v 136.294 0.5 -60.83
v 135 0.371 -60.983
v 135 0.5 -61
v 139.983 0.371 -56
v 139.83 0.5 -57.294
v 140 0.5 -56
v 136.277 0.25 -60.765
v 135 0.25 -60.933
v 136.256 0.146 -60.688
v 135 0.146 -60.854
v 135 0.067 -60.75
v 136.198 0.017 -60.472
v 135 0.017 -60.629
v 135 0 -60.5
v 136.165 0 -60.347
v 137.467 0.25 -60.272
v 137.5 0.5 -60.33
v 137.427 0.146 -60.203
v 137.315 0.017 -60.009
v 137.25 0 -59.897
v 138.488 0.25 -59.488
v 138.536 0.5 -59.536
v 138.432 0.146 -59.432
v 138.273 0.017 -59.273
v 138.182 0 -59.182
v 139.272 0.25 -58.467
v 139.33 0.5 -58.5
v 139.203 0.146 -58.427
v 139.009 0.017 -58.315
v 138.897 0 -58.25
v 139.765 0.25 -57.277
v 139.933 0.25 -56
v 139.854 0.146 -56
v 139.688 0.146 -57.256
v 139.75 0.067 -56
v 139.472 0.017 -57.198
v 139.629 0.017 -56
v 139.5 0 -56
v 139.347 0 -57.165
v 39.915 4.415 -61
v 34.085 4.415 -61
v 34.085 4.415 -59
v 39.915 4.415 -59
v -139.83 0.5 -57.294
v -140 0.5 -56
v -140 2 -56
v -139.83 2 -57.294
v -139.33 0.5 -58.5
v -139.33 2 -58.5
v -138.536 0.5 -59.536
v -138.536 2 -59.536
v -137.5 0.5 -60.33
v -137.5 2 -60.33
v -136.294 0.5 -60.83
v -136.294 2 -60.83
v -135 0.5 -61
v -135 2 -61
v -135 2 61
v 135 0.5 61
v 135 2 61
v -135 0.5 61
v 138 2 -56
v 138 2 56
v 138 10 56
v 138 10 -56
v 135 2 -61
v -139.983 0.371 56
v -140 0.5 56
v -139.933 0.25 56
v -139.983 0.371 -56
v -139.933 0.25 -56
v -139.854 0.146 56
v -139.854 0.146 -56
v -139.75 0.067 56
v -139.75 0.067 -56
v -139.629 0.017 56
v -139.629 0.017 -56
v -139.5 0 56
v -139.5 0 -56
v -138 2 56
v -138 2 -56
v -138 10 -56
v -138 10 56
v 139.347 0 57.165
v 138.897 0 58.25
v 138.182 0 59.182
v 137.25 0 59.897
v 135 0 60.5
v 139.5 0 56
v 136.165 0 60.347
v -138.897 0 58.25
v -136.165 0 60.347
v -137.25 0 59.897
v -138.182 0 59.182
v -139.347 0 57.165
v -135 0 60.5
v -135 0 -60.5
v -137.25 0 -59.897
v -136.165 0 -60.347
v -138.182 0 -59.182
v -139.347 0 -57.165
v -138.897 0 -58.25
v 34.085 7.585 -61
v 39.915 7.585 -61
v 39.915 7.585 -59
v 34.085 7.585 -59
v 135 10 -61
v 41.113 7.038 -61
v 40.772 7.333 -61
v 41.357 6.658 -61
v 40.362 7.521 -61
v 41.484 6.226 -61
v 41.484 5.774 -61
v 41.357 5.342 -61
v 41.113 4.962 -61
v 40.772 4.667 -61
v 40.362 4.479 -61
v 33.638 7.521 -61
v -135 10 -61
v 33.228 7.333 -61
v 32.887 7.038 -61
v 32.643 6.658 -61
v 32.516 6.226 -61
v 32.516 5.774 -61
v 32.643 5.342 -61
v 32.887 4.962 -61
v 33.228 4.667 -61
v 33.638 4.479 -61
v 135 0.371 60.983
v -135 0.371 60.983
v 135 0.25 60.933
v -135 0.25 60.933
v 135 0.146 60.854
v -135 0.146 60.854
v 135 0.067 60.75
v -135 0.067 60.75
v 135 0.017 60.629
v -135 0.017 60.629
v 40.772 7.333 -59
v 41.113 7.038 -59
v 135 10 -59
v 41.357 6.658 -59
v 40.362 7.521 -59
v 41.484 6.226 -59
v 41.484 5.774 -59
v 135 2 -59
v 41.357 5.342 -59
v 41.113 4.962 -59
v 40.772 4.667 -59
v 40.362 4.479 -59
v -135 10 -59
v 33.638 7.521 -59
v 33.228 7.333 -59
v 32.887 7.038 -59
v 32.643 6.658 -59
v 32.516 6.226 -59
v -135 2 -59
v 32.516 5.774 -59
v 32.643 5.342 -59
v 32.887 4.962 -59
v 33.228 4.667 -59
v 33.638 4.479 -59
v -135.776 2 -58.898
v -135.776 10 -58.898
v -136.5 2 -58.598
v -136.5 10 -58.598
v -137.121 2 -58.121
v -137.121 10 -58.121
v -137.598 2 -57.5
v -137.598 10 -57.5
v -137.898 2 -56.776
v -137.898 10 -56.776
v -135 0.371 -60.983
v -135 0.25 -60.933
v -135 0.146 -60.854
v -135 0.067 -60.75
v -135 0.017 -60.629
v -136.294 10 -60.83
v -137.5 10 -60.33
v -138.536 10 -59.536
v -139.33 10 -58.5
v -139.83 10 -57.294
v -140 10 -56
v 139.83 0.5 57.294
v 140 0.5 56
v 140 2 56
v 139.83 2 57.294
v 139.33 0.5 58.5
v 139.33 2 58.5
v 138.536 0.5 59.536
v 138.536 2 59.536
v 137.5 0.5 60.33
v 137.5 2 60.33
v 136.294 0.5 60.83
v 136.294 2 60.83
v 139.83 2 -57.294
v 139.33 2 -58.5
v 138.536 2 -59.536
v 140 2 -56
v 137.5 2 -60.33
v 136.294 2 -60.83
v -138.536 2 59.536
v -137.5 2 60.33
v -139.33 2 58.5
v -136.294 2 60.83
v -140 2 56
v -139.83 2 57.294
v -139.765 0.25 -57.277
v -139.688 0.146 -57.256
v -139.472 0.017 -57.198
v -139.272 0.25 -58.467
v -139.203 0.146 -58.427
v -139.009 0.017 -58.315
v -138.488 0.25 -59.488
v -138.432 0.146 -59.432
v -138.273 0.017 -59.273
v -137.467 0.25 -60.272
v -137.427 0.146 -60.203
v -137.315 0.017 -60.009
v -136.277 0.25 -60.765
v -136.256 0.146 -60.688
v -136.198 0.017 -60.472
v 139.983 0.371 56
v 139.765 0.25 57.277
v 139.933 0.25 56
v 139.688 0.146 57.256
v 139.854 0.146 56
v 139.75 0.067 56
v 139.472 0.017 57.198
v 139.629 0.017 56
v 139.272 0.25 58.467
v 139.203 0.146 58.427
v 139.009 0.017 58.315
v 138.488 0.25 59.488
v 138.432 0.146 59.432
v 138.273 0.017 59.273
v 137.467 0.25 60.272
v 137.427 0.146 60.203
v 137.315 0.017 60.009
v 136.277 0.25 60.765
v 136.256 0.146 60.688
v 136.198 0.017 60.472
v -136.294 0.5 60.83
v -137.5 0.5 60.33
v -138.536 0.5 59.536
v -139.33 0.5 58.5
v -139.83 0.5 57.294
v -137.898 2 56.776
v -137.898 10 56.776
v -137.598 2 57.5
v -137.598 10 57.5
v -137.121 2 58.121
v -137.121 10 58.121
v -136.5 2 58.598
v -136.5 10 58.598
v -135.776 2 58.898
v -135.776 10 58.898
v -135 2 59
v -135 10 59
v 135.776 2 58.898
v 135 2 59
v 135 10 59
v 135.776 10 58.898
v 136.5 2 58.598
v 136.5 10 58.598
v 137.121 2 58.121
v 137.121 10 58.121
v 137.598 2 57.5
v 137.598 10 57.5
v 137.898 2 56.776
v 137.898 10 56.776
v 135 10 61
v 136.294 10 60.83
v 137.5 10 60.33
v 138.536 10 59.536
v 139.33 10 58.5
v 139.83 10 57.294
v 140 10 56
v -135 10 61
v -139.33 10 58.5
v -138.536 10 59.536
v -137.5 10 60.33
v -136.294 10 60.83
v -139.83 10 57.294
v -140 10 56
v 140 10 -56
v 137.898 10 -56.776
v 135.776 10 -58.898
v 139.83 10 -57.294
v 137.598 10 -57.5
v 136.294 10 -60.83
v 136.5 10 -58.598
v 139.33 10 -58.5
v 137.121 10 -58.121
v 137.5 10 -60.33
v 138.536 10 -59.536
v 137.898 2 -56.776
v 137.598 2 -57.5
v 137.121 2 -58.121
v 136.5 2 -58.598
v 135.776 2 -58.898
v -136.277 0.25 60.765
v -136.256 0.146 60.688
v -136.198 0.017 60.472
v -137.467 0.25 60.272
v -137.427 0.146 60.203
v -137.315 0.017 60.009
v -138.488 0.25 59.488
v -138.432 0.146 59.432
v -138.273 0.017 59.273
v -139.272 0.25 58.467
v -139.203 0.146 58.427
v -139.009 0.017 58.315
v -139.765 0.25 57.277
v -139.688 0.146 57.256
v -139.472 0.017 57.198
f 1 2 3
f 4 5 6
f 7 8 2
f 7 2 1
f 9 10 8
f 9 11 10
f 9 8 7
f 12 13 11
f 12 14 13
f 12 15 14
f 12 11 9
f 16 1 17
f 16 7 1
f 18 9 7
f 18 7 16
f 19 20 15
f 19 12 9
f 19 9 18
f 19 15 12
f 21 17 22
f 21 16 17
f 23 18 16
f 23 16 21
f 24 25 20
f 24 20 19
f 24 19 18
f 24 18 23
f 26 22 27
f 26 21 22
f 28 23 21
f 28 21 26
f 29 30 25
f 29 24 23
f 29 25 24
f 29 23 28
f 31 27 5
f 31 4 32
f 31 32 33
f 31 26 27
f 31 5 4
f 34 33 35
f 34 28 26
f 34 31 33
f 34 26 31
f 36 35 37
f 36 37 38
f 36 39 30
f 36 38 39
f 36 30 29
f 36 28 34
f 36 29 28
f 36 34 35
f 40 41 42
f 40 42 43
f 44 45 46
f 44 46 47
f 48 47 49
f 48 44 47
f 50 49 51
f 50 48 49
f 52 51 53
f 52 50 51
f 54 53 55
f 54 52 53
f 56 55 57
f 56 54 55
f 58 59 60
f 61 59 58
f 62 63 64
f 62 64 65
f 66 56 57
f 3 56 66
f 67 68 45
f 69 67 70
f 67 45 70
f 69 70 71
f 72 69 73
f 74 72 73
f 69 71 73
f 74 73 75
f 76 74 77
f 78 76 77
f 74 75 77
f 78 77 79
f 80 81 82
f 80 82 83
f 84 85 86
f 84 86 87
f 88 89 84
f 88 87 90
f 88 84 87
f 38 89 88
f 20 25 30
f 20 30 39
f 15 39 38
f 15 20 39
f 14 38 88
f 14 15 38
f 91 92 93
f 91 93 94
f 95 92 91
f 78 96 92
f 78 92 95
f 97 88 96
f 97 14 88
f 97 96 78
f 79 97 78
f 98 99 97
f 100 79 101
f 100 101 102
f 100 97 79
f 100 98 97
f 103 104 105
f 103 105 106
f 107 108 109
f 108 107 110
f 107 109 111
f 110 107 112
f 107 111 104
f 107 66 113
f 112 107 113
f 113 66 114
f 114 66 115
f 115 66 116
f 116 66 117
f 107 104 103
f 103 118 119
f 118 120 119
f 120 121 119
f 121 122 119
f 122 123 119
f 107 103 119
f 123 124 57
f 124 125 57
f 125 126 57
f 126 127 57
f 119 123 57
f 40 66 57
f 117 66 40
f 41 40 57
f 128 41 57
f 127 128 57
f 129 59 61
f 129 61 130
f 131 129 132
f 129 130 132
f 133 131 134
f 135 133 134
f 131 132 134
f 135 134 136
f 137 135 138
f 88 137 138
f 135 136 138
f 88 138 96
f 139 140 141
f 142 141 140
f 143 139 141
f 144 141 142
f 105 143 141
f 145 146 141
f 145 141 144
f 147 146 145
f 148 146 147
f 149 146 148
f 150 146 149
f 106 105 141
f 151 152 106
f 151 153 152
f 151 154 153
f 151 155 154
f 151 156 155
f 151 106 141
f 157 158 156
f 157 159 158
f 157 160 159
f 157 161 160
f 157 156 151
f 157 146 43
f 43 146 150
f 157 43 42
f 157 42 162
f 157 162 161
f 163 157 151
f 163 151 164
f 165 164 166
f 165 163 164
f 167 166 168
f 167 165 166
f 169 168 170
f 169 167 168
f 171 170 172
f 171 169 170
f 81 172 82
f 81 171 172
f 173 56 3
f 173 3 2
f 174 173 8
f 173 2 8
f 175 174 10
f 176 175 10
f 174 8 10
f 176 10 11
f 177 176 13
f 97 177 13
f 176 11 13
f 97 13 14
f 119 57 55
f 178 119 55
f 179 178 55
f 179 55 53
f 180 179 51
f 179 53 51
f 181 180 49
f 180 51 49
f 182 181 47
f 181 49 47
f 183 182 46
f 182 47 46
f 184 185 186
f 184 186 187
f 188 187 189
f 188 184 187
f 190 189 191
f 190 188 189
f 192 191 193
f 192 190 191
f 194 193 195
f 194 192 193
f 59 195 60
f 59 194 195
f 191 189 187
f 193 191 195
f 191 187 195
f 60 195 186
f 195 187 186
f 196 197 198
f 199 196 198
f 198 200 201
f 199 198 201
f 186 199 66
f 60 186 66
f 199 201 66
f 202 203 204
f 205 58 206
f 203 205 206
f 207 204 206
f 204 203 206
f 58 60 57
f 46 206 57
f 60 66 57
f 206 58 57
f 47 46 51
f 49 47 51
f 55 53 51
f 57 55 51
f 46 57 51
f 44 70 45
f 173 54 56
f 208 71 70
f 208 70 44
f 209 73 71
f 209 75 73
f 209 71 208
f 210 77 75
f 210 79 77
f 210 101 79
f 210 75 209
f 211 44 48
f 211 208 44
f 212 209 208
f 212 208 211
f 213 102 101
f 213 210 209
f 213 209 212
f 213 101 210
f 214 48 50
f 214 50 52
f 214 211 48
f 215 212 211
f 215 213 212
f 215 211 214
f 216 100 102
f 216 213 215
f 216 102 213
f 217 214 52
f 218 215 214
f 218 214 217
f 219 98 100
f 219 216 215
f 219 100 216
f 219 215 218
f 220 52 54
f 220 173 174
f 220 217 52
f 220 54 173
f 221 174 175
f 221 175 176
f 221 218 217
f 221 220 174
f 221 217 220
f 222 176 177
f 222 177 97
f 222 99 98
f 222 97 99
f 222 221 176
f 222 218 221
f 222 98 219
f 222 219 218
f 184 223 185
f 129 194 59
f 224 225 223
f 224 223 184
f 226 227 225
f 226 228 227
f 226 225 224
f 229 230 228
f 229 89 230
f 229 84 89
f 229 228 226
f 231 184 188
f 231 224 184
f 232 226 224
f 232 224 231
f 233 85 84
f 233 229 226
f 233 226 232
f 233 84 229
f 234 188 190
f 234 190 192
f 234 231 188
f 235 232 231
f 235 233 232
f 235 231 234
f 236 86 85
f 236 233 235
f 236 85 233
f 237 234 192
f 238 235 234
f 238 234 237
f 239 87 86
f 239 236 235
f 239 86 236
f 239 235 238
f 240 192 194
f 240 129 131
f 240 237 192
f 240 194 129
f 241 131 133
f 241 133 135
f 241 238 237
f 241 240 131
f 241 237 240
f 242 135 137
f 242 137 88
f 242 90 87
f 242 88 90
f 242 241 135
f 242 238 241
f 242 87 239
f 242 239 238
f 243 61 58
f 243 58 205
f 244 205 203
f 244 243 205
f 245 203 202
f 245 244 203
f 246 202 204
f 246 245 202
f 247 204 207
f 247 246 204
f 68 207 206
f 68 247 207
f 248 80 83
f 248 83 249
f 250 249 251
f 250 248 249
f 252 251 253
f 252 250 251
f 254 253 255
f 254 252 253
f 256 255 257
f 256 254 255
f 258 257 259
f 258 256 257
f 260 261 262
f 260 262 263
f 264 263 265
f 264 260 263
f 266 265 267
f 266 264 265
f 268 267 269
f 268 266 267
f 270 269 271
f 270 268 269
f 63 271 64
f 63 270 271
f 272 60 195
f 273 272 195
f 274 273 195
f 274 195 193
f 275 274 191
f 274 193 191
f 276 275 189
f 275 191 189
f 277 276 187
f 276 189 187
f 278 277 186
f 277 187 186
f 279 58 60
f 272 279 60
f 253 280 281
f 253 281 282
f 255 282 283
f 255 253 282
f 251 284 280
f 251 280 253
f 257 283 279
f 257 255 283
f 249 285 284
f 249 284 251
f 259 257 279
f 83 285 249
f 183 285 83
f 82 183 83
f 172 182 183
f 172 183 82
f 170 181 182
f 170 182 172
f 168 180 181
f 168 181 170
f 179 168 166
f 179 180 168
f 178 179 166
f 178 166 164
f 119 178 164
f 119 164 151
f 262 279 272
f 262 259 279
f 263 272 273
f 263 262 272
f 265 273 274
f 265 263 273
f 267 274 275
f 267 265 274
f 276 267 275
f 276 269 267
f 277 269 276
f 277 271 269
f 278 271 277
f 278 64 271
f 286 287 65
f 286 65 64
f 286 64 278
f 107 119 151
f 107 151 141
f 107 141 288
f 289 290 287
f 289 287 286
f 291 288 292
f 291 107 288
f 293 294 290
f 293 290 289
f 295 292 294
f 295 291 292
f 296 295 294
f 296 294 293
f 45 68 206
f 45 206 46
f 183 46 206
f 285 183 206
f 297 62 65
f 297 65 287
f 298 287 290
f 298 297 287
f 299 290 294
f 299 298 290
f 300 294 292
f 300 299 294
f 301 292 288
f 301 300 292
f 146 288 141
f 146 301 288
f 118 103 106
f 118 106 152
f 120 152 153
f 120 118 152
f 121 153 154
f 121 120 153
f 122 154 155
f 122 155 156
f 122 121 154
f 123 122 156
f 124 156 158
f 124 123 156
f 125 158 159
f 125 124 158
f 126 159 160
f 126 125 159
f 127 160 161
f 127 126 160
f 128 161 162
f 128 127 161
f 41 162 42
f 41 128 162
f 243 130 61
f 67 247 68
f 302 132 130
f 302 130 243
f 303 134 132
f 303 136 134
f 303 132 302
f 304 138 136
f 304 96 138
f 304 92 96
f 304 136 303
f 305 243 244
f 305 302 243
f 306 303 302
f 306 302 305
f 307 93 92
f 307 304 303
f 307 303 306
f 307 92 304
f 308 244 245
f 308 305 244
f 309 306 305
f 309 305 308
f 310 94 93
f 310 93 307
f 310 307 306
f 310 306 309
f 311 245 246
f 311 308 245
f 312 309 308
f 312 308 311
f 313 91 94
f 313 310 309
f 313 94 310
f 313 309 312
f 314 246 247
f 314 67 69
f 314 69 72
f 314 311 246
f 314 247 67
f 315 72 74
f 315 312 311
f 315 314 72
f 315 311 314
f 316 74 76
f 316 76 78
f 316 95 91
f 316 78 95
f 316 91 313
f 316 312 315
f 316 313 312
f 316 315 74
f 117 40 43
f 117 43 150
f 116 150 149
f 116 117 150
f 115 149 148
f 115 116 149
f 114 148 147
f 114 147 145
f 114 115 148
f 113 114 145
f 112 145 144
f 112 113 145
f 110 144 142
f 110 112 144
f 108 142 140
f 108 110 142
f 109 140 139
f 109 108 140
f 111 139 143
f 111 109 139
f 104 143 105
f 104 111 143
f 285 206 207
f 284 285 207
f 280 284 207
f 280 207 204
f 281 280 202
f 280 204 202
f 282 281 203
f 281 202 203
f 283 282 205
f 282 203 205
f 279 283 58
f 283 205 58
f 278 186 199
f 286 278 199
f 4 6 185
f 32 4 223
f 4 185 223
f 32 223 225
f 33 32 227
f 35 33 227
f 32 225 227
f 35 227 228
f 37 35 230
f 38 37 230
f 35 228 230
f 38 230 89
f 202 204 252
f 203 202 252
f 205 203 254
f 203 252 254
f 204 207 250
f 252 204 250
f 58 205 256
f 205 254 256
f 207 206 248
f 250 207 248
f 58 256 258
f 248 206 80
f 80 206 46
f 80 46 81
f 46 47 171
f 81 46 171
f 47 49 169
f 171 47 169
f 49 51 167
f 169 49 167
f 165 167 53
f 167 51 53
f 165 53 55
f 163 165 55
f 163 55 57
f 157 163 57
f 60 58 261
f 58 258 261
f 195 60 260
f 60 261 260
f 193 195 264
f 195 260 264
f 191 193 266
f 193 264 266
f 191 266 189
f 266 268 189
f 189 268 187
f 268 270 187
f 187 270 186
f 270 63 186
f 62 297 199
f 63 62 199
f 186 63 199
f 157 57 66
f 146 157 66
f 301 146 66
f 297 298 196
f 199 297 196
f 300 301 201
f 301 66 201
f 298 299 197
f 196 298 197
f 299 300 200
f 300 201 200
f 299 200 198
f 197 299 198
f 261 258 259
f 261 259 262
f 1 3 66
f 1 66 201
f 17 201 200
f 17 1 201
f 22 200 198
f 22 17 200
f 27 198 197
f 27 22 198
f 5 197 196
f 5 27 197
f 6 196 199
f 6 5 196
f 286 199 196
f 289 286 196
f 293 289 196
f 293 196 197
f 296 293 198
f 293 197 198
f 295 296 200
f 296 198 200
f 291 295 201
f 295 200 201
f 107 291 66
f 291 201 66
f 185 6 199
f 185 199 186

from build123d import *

# Parameters (mm, degrees)
EXTRUDE_1_DEPTH     = 2
EXTRUDE_2_DEPTH     = 8
CUT_EXTRUDE_7_DEPTH = 2
FILLET_1_R          = 0.5


with BuildPart() as part:
    # 草图1 → 凸台-拉伸1 (new body)
    with BuildSketch(Plane(origin=(0, 0, 0), x_dir=(1, 0, 0), z_dir=(0, 1, 0))):
        with BuildLine():
            Line((-135, 61), (135, 61))
            ThreePointArc((135, 61), (138.535533906, 59.535533906), (140, 56))
            Line((140, 56), (140, -56))
            ThreePointArc((140, -56), (138.535533906, -59.535533906), (135, -61))
            Line((135, -61), (-135, -61))
            ThreePointArc((-135, -61), (-138.535533906, -59.535533906), (-140, -56))
            Line((-140, -56), (-140, 56))
            ThreePointArc((-140, 56), (-138.535533906, 59.535533906), (-135, 61))
        make_face()
    extrude(amount=EXTRUDE_1_DEPTH)

    # 圆角1
    fillet_1_edges = [part.edges().sort_by_distance(p)[0] for p in [
        (-140, 0, 0),
        (-138.535533906, 0, -59.535533906),
        (0, 0, -61),
        (138.535533906, 0, -59.535533906),
        (140, 0, 0),
        (138.535533906, 0, 59.535533906),
        (0, 0, 61),
        (-138.535533906, 0, 59.535533906),
    ]]
    fillet(fillet_1_edges, radius=FILLET_1_R)


with BuildPart() as body_2:
    # 草图2 → 凸台-拉伸2 (new body)
    with BuildSketch(Plane(origin=(0, 2, 0), x_dir=(1, 0, 0), z_dir=(0, 1, 0))):
        with BuildLine():
            Line((135, 61), (-135, 61))
            ThreePointArc((-135, 61), (-138.535533906, 59.535533906), (-140, 56))
            Line((-140, 56), (-140, -56))
            ThreePointArc((-140, -56), (-138.535533906, -59.535533906), (-135, -61))
            Line((-135, -61), (135, -61))
            ThreePointArc((135, -61), (138.535533906, -59.535533906), (140, -56))
            Line((140, -56), (140, 56))
            ThreePointArc((140, 56), (138.535533906, 59.535533906), (135, 61))
        make_face()
        with BuildLine():
            Line((135, 59), (-135, 59))
            ThreePointArc((-135, 59), (-137.121320344, 58.121320344), (-138, 56))
            Line((-138, 56), (-138, -56))
            ThreePointArc((-138, -56), (-137.121320344, -58.121320344), (-135, -59))
            Line((-135, -59), (135, -59))
            ThreePointArc((135, -59), (137.121320344, -58.121320344), (138, -56))
            Line((138, -56), (138, 56))
            ThreePointArc((138, 56), (137.121320344, 58.121320344), (135, 59))
        make_face(mode=Mode.SUBTRACT)
    extrude(amount=EXTRUDE_2_DEPTH)

    # 草图3 → 切除-拉伸7 (cut)
    with BuildSketch(Plane(origin=(0, 0, -61), x_dir=(-1, 0, 0), z_dir=(0, 0, -1))):
        with BuildLine():
            Line((-39.915, 7.585), (-34.085, 7.585))
            ThreePointArc((-34.085, 7.585), (-32.5, 6), (-34.085, 4.415))
            Line((-34.085, 4.415), (-39.915, 4.415))
            ThreePointArc((-39.915, 4.415), (-41.5, 6), (-39.915, 7.585))
        make_face()
    extrude(amount=-CUT_EXTRUDE_7_DEPTH, mode=Mode.SUBTRACT)


solid = Compound([part.part, body_2.part])
